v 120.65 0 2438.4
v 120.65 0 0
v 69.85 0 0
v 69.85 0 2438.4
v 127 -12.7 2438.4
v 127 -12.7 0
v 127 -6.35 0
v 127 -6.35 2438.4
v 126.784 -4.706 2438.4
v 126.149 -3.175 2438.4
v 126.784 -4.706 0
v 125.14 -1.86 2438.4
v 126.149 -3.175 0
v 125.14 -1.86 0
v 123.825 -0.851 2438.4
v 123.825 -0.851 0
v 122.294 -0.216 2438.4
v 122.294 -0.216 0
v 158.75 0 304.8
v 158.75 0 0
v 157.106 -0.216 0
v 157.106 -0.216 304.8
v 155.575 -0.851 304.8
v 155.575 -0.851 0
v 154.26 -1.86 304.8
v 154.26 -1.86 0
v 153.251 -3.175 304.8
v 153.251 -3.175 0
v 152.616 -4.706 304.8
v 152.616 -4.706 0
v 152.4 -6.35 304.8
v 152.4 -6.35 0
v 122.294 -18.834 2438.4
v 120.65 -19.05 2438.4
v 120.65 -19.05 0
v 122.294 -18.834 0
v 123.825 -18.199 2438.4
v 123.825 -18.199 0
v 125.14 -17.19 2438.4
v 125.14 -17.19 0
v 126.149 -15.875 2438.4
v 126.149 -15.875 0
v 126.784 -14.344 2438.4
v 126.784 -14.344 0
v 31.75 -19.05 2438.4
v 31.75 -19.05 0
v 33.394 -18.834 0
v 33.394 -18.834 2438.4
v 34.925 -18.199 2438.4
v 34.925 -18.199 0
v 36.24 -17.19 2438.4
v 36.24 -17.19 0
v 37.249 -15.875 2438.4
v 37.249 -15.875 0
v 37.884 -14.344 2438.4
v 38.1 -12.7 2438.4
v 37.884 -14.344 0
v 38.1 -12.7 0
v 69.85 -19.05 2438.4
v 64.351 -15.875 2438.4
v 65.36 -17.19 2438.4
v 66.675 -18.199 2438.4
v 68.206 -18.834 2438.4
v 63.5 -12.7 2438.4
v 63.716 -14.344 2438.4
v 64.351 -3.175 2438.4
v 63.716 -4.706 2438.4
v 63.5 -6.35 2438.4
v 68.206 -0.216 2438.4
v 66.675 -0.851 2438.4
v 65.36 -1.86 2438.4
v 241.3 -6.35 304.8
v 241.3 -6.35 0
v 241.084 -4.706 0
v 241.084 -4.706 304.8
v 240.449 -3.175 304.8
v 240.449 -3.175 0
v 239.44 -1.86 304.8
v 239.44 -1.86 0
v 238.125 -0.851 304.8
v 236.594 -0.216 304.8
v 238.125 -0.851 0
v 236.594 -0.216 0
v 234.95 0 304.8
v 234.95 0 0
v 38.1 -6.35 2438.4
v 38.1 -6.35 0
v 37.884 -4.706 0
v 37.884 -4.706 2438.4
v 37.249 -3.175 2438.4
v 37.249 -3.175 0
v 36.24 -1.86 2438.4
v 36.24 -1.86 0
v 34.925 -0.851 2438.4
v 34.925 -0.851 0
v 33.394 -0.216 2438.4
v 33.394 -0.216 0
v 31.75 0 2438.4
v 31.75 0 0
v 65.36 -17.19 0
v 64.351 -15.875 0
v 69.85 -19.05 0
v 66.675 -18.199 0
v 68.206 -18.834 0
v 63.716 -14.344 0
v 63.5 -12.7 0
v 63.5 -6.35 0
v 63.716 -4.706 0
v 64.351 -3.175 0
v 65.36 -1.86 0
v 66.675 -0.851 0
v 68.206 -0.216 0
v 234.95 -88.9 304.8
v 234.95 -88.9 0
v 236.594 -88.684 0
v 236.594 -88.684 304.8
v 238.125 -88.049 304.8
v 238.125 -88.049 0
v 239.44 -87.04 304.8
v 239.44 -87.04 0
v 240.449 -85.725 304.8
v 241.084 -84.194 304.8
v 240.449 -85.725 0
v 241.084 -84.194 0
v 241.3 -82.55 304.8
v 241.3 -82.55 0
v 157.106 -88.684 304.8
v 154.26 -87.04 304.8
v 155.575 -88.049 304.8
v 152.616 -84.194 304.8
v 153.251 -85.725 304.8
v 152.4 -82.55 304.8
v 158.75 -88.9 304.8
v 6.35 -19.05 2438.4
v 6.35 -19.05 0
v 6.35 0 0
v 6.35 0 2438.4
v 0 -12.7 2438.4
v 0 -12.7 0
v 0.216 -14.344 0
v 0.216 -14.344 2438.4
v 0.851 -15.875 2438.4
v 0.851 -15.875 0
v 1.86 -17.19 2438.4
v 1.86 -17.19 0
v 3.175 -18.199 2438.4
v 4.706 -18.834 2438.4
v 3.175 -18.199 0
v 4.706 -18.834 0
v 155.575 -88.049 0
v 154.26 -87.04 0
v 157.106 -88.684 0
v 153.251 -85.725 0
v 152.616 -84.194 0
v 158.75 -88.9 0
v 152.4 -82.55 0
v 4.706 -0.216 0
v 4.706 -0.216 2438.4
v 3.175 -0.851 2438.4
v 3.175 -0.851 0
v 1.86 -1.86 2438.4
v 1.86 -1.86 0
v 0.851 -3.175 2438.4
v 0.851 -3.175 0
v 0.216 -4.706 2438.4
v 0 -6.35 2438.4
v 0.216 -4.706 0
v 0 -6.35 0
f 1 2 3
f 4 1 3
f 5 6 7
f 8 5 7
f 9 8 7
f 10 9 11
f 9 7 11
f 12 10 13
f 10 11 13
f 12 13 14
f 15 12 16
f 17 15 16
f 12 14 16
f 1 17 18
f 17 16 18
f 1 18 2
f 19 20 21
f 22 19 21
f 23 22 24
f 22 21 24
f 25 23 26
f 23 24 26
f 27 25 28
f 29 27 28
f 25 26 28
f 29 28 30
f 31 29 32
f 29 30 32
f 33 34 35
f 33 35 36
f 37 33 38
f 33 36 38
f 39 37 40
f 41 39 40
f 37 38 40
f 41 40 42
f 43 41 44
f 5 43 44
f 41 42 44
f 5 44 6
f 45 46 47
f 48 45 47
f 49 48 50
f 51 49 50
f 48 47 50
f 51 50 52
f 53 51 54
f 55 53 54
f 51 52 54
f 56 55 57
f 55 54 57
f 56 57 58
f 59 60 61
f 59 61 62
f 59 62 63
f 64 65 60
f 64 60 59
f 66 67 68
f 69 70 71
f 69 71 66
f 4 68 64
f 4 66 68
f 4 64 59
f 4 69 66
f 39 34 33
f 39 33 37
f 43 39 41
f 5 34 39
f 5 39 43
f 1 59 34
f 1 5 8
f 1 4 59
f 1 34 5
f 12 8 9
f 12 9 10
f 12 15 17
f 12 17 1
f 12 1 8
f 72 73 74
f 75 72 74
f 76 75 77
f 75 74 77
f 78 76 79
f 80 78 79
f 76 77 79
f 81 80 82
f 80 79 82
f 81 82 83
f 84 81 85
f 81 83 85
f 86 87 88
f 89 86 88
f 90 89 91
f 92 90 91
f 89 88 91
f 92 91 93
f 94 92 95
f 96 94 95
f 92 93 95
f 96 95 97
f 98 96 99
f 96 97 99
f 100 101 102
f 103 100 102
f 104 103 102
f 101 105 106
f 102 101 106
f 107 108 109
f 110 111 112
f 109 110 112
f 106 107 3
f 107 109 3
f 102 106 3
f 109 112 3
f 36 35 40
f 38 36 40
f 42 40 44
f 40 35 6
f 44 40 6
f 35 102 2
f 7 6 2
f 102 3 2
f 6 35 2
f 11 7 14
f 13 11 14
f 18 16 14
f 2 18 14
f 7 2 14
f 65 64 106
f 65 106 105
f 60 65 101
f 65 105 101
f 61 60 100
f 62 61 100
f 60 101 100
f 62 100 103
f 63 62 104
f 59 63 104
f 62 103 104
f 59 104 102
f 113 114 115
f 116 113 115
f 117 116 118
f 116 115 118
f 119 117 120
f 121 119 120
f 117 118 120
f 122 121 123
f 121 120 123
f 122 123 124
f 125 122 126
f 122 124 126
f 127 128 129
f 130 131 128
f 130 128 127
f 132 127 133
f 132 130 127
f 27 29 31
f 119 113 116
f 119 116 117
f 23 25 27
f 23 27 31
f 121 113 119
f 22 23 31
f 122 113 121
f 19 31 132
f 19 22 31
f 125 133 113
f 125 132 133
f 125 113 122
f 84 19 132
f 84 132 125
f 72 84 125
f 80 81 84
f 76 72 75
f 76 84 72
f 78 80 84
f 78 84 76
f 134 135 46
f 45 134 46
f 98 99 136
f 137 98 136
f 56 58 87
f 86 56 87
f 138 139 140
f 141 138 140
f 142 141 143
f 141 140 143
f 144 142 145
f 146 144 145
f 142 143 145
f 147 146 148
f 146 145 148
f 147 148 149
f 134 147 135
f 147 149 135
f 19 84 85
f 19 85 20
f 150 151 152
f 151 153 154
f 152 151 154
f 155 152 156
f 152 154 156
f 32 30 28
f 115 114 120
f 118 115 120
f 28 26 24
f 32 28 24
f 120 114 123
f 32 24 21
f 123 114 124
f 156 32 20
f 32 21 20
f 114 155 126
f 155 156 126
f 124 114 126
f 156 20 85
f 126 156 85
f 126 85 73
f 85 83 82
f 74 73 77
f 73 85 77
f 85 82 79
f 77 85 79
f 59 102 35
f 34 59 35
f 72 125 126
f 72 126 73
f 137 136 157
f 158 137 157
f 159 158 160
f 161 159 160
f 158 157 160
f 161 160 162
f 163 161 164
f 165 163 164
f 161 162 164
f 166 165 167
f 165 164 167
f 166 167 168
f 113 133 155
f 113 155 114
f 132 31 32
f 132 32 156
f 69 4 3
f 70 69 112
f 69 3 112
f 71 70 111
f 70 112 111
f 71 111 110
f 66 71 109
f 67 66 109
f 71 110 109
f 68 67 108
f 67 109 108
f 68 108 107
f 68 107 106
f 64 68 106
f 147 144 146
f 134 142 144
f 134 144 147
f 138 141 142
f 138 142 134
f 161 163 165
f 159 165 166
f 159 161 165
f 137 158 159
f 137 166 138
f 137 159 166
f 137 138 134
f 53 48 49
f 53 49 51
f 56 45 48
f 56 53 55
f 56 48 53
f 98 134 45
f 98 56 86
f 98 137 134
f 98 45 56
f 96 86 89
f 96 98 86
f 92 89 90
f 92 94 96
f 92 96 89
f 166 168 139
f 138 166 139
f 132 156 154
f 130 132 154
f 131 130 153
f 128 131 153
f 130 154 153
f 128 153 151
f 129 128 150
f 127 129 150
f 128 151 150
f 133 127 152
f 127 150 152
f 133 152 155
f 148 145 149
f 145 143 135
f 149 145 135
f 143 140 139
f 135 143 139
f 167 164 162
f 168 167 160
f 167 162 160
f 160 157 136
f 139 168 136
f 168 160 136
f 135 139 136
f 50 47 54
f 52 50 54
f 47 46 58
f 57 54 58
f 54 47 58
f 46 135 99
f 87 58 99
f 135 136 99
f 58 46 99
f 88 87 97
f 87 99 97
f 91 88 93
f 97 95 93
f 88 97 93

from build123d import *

# Parameters (mm, degrees)
F1_DEPTH = 2438.4
F2_DEPTH = 2438.4
F3_DEPTH = 304.8


with BuildPart() as f1:
    # F0 (on Top) → F1 (new body)
    with BuildSketch(Plane.XY):
        with BuildLine():
            Line((31.75, 0), (6.35, 0))
            ThreePointArc((6.35, 0), (1.859872, -1.859872), (0, -6.35))
            Line((0, -6.35), (0, -12.7))
            ThreePointArc((0, -12.7), (1.859872, -17.190128), (6.35, -19.05))
            Line((6.35, -19.05), (31.75, -19.05))
            ThreePointArc((31.75, -19.05), (36.240128, -17.190128), (38.1, -12.7))
            Line((38.1, -12.7), (38.1, -6.35))
            ThreePointArc((38.1, -6.35), (36.240128, -1.859872), (31.75, 0))
        make_face()
    extrude(amount=F1_DEPTH)


with BuildPart() as f2:
    # F0 (on Top) → F2 (new body)
    with BuildSketch(Plane.XY):
        with BuildLine():
            Line((120.65, 0), (69.85, 0))
            ThreePointArc((69.85, 0), (65.359872, -1.859872), (63.5, -6.35))
            Line((63.5, -6.35), (63.5, -12.7))
            ThreePointArc((63.5, -12.7), (65.359872, -17.190128), (69.85, -19.05))
            Line((69.85, -19.05), (120.65, -19.05))
            ThreePointArc((120.65, -19.05), (125.140128, -17.190128), (127, -12.7))
            Line((127, -12.7), (127, -6.35))
            ThreePointArc((127, -6.35), (125.140128, -1.859872), (120.65, 0))
        make_face()
    extrude(amount=F2_DEPTH)


with BuildPart() as f3:
    # F0 (on Top) → F3 (new body)
    with BuildSketch(Plane.XY):
        with BuildLine():
            Line((234.95, 0), (158.75, 0))
            ThreePointArc((158.75, 0), (154.259872, -1.859872), (152.4, -6.35))
            Line((152.4, -6.35), (152.4, -82.55))
            ThreePointArc((152.4, -82.55), (154.259872, -87.040128), (158.75, -88.9))
            Line((158.75, -88.9), (234.95, -88.9))
            ThreePointArc((234.95, -88.9), (239.440128, -87.040128), (241.3, -82.55))
            Line((241.3, -82.55), (241.3, -6.35))
            ThreePointArc((241.3, -6.35), (239.440128, -1.859872), (234.95, 0))
        make_face()
    extrude(amount=F3_DEPTH)


solid = Compound([f1.part, f2.part, f3.part])
